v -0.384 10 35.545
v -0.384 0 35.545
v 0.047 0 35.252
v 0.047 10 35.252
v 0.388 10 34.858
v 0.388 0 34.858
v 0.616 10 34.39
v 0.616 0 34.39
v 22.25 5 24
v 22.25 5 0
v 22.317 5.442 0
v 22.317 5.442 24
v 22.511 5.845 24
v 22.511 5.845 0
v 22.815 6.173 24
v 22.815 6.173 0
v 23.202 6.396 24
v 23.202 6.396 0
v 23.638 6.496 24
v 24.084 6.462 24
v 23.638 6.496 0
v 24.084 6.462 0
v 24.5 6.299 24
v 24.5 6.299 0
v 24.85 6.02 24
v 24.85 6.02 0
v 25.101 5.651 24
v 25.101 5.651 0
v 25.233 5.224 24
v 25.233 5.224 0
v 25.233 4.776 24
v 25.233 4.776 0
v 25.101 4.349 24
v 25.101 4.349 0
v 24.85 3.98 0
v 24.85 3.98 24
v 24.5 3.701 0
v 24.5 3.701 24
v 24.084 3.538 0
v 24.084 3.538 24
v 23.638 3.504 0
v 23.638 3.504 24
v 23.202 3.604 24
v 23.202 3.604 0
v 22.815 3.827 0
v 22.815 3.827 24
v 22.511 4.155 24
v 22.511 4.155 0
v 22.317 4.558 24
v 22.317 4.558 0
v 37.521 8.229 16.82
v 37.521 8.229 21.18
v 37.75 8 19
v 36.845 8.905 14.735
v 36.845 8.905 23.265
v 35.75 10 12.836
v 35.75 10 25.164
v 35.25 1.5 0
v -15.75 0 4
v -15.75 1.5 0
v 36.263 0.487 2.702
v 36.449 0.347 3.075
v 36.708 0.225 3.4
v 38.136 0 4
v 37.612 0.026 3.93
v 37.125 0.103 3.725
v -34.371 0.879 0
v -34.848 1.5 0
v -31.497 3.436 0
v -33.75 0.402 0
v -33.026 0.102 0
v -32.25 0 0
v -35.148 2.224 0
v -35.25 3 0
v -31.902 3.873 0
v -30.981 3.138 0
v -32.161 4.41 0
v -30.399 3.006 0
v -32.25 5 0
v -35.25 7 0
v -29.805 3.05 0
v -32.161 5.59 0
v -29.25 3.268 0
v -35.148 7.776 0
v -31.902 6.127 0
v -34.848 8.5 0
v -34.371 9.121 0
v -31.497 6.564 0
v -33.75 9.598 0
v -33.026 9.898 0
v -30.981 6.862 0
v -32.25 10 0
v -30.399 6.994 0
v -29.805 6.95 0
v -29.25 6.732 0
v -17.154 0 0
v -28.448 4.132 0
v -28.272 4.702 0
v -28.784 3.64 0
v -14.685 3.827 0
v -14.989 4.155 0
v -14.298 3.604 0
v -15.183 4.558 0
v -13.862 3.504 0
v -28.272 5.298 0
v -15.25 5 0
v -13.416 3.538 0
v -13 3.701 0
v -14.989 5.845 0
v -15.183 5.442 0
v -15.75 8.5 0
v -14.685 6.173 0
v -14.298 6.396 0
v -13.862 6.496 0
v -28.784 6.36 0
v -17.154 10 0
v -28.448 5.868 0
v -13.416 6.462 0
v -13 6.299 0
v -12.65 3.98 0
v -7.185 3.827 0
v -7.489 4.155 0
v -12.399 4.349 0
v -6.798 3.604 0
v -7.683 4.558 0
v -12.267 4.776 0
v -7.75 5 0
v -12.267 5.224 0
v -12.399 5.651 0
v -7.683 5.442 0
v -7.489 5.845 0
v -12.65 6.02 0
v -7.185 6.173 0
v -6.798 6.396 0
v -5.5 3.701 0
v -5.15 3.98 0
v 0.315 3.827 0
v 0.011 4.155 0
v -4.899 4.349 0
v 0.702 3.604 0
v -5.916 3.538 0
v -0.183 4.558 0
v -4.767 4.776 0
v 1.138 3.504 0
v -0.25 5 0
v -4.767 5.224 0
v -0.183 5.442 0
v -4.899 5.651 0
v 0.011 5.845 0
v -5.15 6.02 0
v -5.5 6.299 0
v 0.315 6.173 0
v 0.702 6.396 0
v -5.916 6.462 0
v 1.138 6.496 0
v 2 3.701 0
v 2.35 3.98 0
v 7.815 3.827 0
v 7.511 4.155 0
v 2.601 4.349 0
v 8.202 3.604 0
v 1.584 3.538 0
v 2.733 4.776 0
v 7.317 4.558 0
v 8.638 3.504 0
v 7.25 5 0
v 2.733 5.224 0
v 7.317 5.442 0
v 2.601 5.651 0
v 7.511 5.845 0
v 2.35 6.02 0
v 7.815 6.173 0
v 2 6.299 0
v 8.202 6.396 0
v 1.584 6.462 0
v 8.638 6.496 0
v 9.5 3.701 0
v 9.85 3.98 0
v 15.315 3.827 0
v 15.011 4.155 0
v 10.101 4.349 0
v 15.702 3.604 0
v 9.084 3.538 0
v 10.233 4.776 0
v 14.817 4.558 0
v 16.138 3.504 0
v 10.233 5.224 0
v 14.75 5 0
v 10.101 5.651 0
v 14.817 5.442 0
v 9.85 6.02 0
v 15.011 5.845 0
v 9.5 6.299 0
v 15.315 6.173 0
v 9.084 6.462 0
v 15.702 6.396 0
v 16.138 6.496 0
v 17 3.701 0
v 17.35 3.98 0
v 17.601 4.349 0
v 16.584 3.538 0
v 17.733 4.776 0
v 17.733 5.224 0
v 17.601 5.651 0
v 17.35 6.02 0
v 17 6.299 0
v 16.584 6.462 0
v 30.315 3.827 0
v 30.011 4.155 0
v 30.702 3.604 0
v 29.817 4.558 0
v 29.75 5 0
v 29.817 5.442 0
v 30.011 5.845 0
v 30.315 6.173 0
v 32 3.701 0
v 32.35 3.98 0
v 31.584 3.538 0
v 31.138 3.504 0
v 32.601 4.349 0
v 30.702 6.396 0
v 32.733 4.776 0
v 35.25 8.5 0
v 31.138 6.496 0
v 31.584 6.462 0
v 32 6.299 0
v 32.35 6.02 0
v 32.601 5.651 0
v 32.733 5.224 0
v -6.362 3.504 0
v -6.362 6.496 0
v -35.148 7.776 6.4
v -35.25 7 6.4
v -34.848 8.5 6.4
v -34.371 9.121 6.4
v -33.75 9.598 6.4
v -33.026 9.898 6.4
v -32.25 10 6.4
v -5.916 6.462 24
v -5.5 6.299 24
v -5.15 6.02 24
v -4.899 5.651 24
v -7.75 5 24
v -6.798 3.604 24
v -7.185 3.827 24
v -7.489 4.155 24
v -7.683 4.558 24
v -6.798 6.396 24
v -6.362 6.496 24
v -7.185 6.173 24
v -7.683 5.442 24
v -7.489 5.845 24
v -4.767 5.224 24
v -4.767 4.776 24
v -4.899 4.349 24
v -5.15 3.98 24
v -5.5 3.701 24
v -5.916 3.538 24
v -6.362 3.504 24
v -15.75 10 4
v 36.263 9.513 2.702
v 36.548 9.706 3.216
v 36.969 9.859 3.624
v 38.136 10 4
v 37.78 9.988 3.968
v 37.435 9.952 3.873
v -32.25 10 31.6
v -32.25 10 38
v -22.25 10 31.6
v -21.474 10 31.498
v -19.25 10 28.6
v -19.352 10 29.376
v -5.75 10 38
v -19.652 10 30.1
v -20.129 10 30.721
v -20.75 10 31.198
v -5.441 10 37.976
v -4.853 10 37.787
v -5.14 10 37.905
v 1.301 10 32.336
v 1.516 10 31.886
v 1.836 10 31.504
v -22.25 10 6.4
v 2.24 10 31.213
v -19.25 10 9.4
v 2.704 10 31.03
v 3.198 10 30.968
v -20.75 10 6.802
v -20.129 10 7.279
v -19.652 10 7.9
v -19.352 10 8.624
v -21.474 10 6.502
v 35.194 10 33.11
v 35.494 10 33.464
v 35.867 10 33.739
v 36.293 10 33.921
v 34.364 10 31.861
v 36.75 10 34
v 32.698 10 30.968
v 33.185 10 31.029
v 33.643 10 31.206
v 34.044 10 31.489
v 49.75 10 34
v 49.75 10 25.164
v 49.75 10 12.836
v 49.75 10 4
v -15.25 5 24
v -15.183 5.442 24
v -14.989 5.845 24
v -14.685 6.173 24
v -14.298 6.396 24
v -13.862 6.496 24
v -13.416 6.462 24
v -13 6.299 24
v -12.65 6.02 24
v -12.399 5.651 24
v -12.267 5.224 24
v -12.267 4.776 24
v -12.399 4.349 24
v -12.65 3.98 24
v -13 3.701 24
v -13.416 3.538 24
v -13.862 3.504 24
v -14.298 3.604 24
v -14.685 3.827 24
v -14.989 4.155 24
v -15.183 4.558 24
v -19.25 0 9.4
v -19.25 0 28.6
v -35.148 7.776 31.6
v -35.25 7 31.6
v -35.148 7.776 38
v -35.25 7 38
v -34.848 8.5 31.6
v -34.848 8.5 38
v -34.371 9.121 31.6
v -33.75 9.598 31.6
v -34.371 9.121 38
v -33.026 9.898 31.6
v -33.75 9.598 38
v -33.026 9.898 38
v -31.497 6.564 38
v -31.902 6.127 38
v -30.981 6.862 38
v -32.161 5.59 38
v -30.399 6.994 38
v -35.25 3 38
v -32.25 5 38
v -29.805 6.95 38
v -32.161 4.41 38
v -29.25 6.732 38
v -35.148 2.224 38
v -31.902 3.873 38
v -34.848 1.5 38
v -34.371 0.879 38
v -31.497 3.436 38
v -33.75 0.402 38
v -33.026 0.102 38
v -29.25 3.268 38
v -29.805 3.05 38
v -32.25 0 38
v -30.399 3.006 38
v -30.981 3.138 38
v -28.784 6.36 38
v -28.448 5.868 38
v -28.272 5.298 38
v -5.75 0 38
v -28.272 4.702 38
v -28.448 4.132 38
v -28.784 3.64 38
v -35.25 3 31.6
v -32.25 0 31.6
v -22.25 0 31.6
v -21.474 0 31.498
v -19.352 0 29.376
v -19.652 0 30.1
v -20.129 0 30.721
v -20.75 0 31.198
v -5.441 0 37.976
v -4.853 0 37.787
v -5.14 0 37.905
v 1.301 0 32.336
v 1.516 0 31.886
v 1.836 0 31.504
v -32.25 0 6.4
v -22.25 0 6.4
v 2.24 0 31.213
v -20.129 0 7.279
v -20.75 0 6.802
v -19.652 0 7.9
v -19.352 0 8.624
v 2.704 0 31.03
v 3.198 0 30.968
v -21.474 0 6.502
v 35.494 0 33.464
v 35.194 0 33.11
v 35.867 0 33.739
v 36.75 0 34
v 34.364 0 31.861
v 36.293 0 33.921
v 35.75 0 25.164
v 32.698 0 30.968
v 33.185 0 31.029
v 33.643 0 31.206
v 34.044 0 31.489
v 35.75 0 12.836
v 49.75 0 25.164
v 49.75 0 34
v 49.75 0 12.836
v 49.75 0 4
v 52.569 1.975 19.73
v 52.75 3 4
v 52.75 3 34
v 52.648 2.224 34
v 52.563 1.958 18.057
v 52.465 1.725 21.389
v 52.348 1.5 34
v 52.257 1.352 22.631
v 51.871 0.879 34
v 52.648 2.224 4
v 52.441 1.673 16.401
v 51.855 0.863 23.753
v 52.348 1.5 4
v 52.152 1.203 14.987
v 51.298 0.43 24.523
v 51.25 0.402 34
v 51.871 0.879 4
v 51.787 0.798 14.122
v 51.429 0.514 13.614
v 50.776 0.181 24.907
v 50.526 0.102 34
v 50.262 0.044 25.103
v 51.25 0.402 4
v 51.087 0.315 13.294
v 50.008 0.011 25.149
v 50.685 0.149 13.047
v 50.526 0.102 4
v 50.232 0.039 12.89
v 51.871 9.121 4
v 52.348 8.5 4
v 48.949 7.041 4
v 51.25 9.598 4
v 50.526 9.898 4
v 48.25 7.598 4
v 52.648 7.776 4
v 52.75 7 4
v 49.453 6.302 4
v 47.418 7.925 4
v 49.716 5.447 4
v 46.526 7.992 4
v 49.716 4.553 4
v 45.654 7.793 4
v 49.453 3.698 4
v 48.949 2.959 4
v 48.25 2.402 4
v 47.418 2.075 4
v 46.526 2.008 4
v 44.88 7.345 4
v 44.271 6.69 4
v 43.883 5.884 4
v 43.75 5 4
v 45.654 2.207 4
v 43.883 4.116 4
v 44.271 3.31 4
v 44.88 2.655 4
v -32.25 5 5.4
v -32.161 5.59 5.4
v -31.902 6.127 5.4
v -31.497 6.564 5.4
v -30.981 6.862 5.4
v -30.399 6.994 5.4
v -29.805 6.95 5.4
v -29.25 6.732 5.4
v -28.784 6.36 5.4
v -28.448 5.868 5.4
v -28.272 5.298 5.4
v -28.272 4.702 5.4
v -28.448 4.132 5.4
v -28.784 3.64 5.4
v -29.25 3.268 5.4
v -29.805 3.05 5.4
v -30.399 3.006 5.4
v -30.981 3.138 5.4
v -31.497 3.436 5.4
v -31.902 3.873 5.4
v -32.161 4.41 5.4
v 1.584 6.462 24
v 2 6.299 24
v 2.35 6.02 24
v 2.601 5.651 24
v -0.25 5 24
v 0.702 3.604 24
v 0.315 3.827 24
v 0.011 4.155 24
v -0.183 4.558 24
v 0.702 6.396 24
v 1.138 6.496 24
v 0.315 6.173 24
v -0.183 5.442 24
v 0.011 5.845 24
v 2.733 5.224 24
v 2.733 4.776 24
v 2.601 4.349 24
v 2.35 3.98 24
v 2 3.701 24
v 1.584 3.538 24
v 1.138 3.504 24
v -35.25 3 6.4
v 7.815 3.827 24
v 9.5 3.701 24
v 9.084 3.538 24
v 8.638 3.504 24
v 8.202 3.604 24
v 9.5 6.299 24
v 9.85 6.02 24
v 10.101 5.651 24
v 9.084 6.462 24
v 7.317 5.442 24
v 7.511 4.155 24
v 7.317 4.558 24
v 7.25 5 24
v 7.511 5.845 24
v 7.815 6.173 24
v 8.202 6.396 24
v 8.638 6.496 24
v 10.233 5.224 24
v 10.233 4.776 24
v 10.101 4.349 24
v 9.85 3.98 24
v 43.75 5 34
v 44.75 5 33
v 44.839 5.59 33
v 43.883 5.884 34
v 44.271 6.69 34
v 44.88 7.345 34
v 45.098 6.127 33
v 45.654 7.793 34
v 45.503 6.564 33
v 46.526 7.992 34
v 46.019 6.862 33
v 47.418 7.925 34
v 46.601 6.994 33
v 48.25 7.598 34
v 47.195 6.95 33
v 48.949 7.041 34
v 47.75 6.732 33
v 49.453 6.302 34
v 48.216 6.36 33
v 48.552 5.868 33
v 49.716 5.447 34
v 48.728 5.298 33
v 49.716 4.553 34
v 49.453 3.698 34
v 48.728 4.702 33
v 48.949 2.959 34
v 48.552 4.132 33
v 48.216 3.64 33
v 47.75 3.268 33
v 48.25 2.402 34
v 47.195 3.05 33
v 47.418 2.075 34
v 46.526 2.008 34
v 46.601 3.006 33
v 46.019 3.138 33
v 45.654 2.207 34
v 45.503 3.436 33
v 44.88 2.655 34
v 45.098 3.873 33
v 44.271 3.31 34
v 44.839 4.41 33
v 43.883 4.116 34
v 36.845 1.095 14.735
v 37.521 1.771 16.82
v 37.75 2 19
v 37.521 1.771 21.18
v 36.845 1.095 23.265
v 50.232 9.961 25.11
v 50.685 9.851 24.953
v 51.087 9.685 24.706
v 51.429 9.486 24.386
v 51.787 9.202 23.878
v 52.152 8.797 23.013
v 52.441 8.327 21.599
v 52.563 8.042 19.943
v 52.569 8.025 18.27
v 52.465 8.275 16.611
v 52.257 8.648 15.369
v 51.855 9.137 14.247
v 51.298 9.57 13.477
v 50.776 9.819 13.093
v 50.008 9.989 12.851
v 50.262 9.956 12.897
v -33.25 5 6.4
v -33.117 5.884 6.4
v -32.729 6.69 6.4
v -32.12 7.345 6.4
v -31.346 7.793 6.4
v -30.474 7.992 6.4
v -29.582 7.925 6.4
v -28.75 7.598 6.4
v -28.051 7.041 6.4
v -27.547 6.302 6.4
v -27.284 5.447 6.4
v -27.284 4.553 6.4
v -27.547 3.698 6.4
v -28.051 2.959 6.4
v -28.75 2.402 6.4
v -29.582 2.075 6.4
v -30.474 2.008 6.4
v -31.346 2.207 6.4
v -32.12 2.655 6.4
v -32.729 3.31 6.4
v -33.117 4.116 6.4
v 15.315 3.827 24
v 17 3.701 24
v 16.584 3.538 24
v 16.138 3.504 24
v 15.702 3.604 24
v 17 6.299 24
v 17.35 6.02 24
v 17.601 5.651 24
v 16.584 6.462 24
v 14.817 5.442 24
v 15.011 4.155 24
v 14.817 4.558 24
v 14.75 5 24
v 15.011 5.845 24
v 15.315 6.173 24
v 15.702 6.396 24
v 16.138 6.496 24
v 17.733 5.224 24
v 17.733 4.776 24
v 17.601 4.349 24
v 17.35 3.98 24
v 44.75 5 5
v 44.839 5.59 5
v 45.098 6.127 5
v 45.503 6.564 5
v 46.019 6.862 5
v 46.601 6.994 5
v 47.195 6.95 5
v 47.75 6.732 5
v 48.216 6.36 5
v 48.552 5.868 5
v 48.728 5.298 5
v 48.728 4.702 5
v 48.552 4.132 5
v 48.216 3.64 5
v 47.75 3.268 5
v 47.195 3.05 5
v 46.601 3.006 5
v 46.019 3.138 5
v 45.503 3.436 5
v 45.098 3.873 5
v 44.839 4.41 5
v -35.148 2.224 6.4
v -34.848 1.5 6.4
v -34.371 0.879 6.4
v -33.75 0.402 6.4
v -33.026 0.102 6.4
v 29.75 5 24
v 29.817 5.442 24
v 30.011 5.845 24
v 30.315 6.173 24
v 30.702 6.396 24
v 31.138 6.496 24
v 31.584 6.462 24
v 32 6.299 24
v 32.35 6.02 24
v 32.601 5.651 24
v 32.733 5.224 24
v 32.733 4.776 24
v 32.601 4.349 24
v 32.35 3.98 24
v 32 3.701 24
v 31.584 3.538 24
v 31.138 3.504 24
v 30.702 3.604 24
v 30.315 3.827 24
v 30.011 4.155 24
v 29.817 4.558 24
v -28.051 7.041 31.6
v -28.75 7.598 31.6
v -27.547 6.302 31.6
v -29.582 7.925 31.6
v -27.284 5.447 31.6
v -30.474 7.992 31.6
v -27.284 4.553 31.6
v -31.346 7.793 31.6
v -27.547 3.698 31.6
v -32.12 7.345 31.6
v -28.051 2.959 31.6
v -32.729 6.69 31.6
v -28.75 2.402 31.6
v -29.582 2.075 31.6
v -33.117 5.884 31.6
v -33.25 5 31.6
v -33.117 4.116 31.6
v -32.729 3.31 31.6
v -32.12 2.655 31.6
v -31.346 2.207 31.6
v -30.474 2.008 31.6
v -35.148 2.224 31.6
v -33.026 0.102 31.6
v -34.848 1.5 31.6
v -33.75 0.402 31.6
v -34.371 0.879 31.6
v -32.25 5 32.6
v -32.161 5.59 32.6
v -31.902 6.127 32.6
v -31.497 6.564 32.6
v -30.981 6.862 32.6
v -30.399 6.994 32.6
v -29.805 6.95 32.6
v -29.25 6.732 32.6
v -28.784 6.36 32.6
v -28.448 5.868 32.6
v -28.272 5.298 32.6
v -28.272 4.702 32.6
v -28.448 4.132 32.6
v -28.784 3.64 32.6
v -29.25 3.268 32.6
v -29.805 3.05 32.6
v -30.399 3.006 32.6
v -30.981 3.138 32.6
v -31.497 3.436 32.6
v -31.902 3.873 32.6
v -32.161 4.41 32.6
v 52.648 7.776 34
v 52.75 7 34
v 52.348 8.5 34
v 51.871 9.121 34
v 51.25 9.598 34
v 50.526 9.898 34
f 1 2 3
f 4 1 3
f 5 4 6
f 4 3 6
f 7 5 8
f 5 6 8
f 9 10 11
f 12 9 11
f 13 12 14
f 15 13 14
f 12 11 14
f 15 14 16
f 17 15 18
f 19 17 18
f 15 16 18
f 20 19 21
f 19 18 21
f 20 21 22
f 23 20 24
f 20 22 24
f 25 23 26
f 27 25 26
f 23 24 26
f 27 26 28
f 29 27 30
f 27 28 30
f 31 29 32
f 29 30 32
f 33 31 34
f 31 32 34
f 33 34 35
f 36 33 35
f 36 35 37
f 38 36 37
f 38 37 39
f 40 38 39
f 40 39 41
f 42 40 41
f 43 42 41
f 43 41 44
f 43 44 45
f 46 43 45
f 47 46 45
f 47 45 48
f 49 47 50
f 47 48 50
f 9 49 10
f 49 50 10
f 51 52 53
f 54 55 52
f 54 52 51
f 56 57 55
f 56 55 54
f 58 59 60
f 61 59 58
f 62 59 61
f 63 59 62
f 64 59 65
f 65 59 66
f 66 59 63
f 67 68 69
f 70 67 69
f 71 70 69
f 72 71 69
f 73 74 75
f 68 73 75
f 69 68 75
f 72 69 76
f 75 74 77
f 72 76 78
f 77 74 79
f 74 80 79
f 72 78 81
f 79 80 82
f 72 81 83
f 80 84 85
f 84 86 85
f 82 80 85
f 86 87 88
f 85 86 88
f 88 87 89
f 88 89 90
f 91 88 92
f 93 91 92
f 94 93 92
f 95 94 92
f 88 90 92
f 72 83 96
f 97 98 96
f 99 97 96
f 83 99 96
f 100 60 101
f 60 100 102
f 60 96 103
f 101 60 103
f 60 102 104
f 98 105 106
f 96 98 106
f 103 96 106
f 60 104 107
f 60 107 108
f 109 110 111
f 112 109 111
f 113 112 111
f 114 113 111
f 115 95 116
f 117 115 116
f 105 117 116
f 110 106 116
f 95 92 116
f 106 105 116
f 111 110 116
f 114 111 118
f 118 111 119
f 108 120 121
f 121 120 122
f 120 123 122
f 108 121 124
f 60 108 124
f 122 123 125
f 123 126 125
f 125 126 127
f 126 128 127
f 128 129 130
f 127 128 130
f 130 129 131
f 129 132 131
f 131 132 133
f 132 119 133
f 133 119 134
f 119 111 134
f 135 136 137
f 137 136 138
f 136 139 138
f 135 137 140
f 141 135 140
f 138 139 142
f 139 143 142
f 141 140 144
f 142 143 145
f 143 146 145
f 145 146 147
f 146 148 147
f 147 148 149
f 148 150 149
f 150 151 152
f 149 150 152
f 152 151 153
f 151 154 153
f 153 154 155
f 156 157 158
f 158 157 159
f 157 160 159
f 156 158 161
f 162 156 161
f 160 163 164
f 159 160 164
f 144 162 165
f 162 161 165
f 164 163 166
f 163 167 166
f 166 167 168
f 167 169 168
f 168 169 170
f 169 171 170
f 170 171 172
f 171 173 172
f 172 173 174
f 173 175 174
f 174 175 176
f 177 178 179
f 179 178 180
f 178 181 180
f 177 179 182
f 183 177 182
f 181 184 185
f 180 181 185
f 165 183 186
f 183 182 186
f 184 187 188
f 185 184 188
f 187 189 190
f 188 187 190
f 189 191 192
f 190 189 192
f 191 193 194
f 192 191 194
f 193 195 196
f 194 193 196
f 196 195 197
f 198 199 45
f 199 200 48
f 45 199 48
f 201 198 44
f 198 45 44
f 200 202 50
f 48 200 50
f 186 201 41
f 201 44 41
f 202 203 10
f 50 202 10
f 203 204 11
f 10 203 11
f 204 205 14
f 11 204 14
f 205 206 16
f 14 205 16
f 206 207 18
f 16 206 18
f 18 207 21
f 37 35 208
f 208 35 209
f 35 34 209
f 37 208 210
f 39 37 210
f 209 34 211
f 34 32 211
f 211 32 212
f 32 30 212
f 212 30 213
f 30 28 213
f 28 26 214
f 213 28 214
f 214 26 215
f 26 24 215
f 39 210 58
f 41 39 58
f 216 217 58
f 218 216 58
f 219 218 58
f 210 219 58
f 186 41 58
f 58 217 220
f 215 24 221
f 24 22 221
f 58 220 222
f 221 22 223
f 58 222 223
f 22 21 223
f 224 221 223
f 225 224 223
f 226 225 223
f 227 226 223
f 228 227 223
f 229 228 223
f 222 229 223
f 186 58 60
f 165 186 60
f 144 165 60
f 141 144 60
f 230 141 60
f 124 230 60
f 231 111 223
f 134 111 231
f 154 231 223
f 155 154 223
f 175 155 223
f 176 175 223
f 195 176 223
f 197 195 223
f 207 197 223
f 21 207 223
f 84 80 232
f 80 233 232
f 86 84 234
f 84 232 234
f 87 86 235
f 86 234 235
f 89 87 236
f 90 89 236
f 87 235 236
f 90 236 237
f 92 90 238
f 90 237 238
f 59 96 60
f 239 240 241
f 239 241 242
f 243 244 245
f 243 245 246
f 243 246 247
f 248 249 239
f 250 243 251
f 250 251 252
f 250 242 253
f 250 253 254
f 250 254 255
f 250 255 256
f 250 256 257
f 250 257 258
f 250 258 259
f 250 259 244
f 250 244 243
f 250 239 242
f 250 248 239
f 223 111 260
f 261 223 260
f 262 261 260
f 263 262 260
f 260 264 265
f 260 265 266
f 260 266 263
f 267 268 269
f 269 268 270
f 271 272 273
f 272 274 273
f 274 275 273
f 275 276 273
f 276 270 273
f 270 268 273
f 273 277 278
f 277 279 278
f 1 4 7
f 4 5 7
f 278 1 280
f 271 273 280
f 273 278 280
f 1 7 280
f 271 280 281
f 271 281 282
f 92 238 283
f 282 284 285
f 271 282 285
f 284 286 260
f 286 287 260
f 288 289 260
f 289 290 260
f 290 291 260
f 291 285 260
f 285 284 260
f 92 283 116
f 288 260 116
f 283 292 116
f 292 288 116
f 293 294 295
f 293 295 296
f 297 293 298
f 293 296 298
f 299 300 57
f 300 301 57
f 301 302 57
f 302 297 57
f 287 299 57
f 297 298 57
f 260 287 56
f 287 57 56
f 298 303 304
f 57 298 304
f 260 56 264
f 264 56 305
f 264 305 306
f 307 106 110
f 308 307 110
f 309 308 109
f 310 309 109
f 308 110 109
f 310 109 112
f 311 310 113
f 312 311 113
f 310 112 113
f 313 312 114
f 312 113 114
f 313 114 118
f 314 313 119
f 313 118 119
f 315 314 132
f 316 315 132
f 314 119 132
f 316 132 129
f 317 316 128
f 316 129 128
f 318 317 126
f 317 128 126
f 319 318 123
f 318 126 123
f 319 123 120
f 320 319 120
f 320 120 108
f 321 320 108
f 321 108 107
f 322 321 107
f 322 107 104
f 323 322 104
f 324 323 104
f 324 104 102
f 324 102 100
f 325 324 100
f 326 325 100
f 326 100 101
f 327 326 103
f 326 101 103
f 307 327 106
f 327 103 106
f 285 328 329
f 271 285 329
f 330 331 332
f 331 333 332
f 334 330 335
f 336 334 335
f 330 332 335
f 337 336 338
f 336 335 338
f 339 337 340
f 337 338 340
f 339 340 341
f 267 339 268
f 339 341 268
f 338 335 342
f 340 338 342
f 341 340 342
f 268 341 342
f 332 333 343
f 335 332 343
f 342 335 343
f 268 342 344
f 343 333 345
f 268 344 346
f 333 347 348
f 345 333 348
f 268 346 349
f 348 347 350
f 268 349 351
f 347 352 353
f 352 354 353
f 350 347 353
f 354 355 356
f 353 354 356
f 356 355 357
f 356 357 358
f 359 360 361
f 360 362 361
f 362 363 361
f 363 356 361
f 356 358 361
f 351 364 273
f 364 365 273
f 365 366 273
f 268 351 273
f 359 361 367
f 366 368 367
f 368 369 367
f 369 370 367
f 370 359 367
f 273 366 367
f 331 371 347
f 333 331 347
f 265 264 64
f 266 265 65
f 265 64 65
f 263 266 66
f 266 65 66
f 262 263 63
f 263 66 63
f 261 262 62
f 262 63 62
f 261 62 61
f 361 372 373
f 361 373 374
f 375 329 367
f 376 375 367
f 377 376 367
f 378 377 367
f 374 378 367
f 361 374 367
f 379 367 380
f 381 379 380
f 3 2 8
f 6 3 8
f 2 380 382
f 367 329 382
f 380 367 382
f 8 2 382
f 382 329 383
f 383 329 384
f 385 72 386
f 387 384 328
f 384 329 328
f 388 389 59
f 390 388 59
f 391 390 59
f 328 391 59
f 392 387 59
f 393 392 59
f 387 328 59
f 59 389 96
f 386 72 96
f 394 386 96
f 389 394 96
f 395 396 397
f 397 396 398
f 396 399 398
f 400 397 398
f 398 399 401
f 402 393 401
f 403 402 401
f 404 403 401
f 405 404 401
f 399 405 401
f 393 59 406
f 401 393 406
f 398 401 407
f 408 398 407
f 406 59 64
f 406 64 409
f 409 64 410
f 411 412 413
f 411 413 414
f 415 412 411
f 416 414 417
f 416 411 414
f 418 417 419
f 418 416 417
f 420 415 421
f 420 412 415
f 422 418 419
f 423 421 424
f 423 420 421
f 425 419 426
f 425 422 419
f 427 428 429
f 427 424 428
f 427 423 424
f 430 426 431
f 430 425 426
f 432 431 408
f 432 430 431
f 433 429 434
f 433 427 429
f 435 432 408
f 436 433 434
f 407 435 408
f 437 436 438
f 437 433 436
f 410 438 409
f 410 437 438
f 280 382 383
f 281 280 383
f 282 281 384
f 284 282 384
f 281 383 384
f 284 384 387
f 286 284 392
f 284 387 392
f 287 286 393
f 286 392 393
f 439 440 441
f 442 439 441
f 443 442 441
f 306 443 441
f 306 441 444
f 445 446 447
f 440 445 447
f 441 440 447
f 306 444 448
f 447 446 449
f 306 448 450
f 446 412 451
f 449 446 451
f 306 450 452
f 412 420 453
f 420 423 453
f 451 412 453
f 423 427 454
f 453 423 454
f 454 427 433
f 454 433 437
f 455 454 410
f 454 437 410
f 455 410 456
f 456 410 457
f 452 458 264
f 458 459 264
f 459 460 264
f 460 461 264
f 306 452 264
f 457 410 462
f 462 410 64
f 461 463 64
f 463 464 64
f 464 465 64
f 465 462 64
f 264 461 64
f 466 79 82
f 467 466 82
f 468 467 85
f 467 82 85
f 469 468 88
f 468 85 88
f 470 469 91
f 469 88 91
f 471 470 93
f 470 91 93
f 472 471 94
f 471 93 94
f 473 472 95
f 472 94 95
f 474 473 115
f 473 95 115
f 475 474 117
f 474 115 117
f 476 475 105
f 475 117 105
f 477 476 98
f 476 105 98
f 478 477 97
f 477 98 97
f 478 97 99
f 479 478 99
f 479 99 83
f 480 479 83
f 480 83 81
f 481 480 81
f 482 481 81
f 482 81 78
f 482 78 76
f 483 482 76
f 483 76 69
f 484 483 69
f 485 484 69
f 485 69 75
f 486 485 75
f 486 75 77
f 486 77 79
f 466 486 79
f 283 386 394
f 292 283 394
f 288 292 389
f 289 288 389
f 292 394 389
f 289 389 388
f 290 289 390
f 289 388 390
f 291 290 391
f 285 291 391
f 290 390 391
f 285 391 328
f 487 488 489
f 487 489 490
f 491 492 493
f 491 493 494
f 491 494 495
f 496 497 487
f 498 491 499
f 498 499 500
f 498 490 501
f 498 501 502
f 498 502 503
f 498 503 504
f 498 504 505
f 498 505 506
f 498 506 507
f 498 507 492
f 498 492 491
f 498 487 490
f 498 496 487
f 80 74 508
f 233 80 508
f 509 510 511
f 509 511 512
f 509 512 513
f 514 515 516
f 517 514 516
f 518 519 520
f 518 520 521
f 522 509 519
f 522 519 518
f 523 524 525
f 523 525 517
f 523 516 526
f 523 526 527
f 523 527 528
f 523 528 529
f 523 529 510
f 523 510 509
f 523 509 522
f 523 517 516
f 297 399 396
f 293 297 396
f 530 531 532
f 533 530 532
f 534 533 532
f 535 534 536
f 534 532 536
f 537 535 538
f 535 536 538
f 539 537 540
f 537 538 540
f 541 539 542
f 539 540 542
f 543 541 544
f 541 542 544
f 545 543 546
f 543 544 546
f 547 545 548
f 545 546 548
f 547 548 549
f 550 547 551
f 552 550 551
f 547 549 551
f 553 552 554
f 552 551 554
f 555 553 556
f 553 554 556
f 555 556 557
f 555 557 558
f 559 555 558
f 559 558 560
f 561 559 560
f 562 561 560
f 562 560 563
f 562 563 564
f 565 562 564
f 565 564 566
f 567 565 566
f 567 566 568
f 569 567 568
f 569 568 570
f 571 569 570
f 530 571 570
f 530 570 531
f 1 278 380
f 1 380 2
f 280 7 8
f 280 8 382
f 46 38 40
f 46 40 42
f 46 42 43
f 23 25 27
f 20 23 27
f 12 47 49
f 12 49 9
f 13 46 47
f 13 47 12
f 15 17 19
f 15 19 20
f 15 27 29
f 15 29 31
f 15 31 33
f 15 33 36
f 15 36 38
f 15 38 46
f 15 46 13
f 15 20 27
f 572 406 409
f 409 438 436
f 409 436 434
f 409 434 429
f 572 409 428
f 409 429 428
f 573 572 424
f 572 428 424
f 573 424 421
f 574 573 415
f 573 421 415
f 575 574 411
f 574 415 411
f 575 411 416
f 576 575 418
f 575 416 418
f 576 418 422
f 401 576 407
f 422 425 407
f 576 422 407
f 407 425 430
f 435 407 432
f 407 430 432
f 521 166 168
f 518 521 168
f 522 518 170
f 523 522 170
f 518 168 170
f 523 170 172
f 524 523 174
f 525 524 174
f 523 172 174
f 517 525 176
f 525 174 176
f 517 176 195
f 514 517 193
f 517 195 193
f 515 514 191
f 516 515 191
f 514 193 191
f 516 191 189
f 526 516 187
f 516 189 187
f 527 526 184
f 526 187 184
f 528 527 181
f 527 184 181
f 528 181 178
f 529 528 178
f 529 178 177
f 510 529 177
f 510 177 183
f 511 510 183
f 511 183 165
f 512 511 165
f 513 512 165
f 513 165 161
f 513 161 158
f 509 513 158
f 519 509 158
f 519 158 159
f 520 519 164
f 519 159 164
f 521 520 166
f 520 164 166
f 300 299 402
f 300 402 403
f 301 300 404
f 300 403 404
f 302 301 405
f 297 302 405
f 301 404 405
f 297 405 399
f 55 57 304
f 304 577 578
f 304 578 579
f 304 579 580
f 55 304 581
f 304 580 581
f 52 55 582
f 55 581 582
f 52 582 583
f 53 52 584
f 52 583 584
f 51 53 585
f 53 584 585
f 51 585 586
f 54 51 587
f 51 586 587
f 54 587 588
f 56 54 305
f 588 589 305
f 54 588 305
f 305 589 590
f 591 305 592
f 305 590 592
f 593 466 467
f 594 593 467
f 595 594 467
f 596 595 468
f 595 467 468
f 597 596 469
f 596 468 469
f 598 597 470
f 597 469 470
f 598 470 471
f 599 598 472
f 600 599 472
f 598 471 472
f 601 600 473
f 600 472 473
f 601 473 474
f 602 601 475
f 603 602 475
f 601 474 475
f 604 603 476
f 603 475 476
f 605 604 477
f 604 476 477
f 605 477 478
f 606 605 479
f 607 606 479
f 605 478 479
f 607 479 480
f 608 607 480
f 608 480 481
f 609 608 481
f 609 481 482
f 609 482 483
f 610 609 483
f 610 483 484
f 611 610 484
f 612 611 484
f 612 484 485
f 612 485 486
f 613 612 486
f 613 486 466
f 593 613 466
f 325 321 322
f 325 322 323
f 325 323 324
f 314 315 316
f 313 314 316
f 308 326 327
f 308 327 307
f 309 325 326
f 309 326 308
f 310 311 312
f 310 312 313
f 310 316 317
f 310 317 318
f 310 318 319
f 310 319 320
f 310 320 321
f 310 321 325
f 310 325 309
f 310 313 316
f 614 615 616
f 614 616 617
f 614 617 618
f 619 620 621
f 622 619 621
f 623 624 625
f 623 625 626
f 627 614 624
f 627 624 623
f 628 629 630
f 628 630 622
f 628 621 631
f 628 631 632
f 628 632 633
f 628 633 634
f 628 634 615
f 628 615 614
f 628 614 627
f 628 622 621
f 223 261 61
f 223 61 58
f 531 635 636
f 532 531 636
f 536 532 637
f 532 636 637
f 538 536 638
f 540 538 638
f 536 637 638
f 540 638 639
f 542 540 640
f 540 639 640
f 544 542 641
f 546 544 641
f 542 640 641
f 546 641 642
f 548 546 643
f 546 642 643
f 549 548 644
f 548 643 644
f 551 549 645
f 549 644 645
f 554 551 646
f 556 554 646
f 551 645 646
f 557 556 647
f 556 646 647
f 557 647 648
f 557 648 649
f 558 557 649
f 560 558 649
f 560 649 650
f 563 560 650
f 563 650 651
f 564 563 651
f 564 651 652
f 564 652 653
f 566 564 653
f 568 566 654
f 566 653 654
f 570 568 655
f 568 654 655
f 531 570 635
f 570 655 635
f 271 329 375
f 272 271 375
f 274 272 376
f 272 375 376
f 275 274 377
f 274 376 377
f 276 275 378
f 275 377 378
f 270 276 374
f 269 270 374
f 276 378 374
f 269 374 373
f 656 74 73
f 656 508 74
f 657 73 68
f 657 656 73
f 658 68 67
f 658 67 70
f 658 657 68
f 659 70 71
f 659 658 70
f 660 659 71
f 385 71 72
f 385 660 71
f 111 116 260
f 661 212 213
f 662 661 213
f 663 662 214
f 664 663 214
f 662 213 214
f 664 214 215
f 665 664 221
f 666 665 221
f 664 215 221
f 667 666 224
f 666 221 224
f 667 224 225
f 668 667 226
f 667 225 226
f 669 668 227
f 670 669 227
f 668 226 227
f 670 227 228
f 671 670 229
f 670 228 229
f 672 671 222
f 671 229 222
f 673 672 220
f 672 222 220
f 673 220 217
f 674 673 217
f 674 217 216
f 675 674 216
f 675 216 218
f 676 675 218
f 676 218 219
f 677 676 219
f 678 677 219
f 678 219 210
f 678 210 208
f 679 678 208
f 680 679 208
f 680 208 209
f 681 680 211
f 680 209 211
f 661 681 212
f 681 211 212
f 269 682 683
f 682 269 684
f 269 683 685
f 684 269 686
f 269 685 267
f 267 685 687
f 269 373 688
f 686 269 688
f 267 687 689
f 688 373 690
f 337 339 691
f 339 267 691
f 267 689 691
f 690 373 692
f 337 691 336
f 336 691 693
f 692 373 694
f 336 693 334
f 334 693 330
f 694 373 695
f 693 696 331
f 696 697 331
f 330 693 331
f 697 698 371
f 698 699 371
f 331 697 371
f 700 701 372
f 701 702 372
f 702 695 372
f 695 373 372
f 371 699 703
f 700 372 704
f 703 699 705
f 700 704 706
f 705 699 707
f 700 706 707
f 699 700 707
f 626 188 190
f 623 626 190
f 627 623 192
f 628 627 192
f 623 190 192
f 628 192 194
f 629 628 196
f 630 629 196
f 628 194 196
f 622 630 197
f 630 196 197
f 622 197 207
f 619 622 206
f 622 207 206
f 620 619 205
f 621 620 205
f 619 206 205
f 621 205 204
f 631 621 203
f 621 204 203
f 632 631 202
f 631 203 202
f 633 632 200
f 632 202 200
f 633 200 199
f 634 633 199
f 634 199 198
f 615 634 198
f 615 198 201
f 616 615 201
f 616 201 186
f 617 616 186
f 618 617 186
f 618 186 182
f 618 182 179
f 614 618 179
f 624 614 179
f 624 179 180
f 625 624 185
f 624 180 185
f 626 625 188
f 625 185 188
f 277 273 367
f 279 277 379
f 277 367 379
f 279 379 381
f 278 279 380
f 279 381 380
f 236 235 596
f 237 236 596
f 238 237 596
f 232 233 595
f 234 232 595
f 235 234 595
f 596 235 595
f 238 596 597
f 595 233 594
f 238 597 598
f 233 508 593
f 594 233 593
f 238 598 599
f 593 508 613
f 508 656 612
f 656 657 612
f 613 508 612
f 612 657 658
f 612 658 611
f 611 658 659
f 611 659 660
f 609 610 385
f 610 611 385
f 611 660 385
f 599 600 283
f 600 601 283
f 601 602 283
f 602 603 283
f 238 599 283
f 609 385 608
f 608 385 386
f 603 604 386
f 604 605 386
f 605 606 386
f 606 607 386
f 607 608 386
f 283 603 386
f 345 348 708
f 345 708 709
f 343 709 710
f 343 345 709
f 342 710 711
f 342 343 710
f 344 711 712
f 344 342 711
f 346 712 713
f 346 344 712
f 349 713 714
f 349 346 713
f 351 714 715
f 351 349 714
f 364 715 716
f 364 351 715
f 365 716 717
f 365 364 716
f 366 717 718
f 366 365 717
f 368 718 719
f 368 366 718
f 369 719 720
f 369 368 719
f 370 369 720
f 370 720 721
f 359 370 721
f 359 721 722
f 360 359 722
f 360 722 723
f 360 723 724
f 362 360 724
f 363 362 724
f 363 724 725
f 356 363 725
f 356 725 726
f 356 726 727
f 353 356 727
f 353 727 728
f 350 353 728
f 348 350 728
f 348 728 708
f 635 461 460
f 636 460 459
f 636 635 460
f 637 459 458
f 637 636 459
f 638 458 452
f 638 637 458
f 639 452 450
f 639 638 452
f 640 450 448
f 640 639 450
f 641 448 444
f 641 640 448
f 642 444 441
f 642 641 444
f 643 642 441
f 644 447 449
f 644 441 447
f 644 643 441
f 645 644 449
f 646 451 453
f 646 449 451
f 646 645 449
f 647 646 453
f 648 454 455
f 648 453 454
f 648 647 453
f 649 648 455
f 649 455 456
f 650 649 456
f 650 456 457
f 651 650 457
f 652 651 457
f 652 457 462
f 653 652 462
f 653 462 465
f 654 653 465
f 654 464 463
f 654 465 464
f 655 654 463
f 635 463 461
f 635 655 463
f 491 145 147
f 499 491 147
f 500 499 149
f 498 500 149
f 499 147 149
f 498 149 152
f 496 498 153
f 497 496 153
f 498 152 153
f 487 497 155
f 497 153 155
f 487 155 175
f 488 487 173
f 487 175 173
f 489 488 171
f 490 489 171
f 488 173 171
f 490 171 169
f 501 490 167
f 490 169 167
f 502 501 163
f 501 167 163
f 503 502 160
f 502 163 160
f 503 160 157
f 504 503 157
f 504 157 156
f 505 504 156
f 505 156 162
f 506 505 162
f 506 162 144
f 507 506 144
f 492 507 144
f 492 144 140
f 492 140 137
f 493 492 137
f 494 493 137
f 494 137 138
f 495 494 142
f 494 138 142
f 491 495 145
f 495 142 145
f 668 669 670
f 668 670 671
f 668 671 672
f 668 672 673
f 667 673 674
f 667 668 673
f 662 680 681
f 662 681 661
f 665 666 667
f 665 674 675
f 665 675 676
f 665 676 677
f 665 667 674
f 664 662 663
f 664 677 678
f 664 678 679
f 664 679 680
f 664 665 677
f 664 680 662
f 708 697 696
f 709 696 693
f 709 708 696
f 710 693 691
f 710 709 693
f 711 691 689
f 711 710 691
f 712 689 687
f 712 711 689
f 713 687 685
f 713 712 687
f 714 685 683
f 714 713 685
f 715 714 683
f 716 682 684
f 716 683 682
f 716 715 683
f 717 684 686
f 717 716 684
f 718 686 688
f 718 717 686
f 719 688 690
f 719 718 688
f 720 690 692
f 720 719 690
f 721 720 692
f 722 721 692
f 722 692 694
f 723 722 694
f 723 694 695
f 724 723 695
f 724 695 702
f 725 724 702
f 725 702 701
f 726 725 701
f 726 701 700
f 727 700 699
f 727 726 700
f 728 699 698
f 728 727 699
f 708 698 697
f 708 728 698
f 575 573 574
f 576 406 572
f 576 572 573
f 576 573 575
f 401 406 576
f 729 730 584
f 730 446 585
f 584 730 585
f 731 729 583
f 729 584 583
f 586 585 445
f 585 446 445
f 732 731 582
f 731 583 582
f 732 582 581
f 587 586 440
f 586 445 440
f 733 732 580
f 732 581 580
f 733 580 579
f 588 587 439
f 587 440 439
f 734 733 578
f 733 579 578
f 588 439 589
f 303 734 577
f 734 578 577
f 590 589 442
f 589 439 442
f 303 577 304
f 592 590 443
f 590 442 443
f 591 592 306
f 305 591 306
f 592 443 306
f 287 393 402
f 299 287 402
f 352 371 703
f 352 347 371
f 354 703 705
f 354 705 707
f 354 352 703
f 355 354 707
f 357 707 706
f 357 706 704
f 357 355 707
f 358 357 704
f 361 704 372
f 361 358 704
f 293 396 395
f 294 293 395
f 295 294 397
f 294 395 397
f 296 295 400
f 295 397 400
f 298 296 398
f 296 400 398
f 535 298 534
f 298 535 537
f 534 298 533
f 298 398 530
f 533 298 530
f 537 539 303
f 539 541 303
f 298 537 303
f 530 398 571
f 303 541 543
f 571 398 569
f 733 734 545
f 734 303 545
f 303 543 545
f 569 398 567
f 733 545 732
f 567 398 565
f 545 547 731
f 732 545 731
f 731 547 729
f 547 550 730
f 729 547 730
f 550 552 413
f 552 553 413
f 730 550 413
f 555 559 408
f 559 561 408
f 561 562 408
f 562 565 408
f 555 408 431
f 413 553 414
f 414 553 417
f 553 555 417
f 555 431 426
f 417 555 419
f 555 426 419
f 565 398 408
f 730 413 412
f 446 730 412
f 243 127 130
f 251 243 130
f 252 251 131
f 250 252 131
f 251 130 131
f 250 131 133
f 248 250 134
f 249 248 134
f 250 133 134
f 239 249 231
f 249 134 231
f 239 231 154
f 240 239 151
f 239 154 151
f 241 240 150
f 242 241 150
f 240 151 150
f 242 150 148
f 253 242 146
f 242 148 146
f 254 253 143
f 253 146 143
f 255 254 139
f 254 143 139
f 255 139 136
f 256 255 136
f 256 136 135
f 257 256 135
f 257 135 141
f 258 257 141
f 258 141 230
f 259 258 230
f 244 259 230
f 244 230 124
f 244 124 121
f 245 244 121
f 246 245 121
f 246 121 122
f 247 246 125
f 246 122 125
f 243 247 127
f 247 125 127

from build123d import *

# Parameters (mm, degrees)
BOSS_EXTRUDE1_DEPTH           = 10
FILLET1_R                     = 3
CUT_EXTRUDE1_DEPTH            = 55.386
CHAMFER1_SIZE                 = 1.5
MIRROR3_START                 = -3.745316975
MIRROR3_DEPTH                 = 4.272002108
CSK_FOR_M4_SFHCS1_D           = 4
CSK_FOR_M4_SFHCS1_DEPTH       = 6.4
CSK_FOR_M4_SFHCS1_CSINK_D     = 6
CSK_FOR_M4_SFHCS1_CSINK_ANGLE = 90
CSK_FOR_M4_SFHCS2_D           = 4
CSK_FOR_M4_SFHCS2_CSINK_D     = 6
CSK_FOR_M4_SFHCS2_CSINK_ANGLE = 90
SKETCH7_R                     = 1.5
CUT_EXTRUDE2_DEPTH            = 24
SKETCH8_R                     = 10.5
CUT_EXTRUDE3_DEPTH            = 15
CHAMFER2_SIZE                 = 2


# Read off the part's stored shape, not the designer's step: Mirror3
with BuildPart() as part:
    # Sketch1 → Boss-Extrude1 (new body)
    with BuildSketch(Plane(origin=(0, 0, 0), x_dir=(1, 0, 0), z_dir=(0, 1, 0))):
        with BuildLine():
            Line((-35.25, 0), (-35.25, -6.4))
            Line((-35.25, -6.4), (-22.25, -6.4))
            ThreePointArc((-22.25, -6.4), (-20.128679656, -7.278679656), (-19.25, -9.4))
            Line((-19.25, -9.4), (-19.25, -28.6))
            ThreePointArc((-19.25, -28.6), (-20.128679656, -30.721320344), (-22.25, -31.6))
            Line((-22.25, -31.6), (-35.25, -31.6))
            Line((-35.25, -31.6), (-35.25, -38))
            Line((-35.25, -38), (-5.75, -38))
            ThreePointArc((-5.75, -38), (-5.289009014, -37.946146786), (-4.852843875, -37.787487311))
            Line((-4.852843875, -37.787487311), (-0.384125597, -35.544596998))
            ThreePointArc((-0.384125597, -35.544596998), (0.230625744, -35.066359782), (0.616084961, -34.389564956))
            Line((0.616084961, -34.389564956), (1.30066574, -32.33582167))
            ThreePointArc((1.30066574, -32.33582167), (2.028611742, -31.34579265), (3.198032424, -30.968276939))
            Line((3.198032424, -30.968276939), (32.698032424, -30.968276939))
            ThreePointArc((32.698032424, -30.968276939), (33.642903174, -31.205546312), (34.363585035, -31.861057674))
            Line((34.363585035, -31.861057674), (35.193999483, -33.110222133))
            ThreePointArc((35.193999483, -33.110222133), (35.866740637, -33.73918414), (36.750000973, -34.000000252))
            Line((36.750000973, -34.000000252), (52.750000973, -34.000000252))
            Line((52.750000973, -34.000000252), (52.750000973, -4.000000252))
            Line((52.750000973, -4.000000252), (38.13600074, -4.000000252))
            ThreePointArc((38.13600074, -4.000000252), (36.996810987, -3.643851433), (36.263342318, -2.702246958))
            Line((36.263342318, -2.702246958), (35.25, 0))
            Line((35.25, 0), (-35.25, 0))
        make_face()
    extrude(amount=BOSS_EXTRUDE1_DEPTH)

    # Fillet1
    fillet1_edges = [part.edges().sort_by_distance(p)[0] for p in [
        (52.750000973, 0, 19.000000252),
        (-35.25, 0, 34.8),
        (-35.25, 0, 3.2),
        (-35.25, 10, 34.8),
        (52.750000973, 10, 19.000000252),
        (-35.25, 10, 3.2),
    ]]
    fillet(fillet1_edges, radius=FILLET1_R)

    # Sketch2 → Cut-Extrude1 (cut)
    with BuildSketch(Plane(origin=(38.13600074, 0, 0), x_dir=(0, 0, -1), z_dir=(1, 0, 0))):
        Polygon((-4.000000252, 10), (0, 10), (0, 8.5), align=None)
    extrude(amount=-CUT_EXTRUDE1_DEPTH, mode=Mode.SUBTRACT)

    # Chamfer1
    # the kernel refuses this chamfer: 1.5 mm, written as the material it adds along each edge
    with BuildSketch(Plane(origin=(-17.24999926, 7.145532803, -3.611912754), x_dir=(-0.027495876610586757, 0.9359751746095561, -0.35099066837171944), z_dir=(0, 0.3511234221997007, 0.9363291848398034))) as chamfer1_piece_1_section:
        Polygon((CHAMFER1_SIZE * 0.999621916911, -CHAMFER1_SIZE * 0.0274958766106), (-CHAMFER1_SIZE * 0.0274958766106, -CHAMFER1_SIZE * 0.999621916911), (0, 0), align=None)
    chamfer1_piece_1 = extrude(amount=11.987051072, mode=Mode.PRIVATE)
    chamfer1_piece_1 = split(chamfer1_piece_1, bisect_by=Plane(origin=(-16.68097762, 9.443284972, 0), z_dir=(0, 0, 1)), keep=Keep.TOP, mode=Mode.PRIVATE)
    chamfer1_piece_1 = split(chamfer1_piece_1, bisect_by=Plane(origin=(-16.68097762, 10, 1.484573502), z_dir=(0, -1, 0)), keep=Keep.TOP, mode=Mode.PRIVATE)
    add(chamfer1_piece_1)

    # Mirror3 outline → Mirror3 (cut)
    with BuildSketch(Plane(origin=(0, 0, 0), x_dir=(1, 0, 0), z_dir=(0, 0.3511234221997011, -0.9363291848398033)).offset(MIRROR3_START)):
        Polygon((-15.74999926, -1.404493777), (40, -1.404493777), (40, 2), (-19, 2), (-19, 1.845506963), align=None)
    extrude(amount=MIRROR3_DEPTH, mode=Mode.SUBTRACT)

    # CSK for M4 SFHCS1
    with Locations(Plane.XY.offset(6.4)):
        with Locations((-30.25, 5)):
            csk_for_m4_sfhcs1 = CounterSinkHole(CSK_FOR_M4_SFHCS1_D / 2, CSK_FOR_M4_SFHCS1_CSINK_D / 2, depth=CSK_FOR_M4_SFHCS1_DEPTH, counter_sink_angle=CSK_FOR_M4_SFHCS1_CSINK_ANGLE)

    # Mirror1: CSK for M4 SFHCS1 across plane
    add(csk_for_m4_sfhcs1.mirror(Plane.XY.offset(19)), mode=Mode.SUBTRACT)

    # CSK for M4 SFHCS2 (through all)
    with Locations(Plane.XY.offset(34.000000252)):
        with Locations((46.750000973, 5)):
            csk_for_m4_sfhcs2 = CounterSinkHole(CSK_FOR_M4_SFHCS2_D / 2, CSK_FOR_M4_SFHCS2_CSINK_D / 2, counter_sink_angle=CSK_FOR_M4_SFHCS2_CSINK_ANGLE)

    # Mirror2: CSK for M4 SFHCS2 across plane
    add(csk_for_m4_sfhcs2.mirror(Plane.XY.offset(19)), mode=Mode.SUBTRACT)

    # Sketch7 → Cut-Extrude2 (cut)
    with BuildSketch(Plane(origin=(0, 0, 0), x_dir=(-1, 0, 0), z_dir=(0, 0, -1))):
        with Locations((-31.25, 5)):
            Circle(SKETCH7_R)
        with Locations((-23.75, 5)):
            Circle(SKETCH7_R)
        with Locations((-16.25, 5)):
            Circle(SKETCH7_R)
        with Locations((-8.75, 5)):
            Circle(SKETCH7_R)
        with Locations((-1.25, 5)):
            Circle(SKETCH7_R)
        with Locations((6.25, 5)):
            Circle(SKETCH7_R)
        with Locations((13.75, 5)):
            Circle(SKETCH7_R)
    extrude(amount=-CUT_EXTRUDE2_DEPTH, mode=Mode.SUBTRACT)

    # Sketch8 → Cut-Extrude3 (cut)
    with BuildSketch(Plane(origin=(52.750000973, 0, 0), x_dir=(0, 0, -1), z_dir=(1, 0, 0))):
        with Locations((-19.000000252, 18.5)):
            Circle(SKETCH8_R)
        with Locations((-19.000000252, -8.5)):
            Circle(SKETCH8_R)
    extrude(amount=-CUT_EXTRUDE3_DEPTH, mode=Mode.SUBTRACT)

    # Chamfer2
    # the kernel refuses this chamfer: 2 mm, written as the material it adds along each edge
    # the kernel refuses this chamfer: 2 mm, written as the material it takes off along each edge
    with BuildSketch(Plane(origin=(37.750000973, 10, 7.692220273), x_dir=(-0.9996219169112968, 0.02749587661058651, 0), z_dir=(0, 0, 1))) as chamfer2_2_piece_1_section:
        Polygon((CHAMFER2_SIZE * 0.999621916911, CHAMFER2_SIZE * 0.0274958766106), (-CHAMFER2_SIZE * 0.0274958766106, CHAMFER2_SIZE * 0.999621916911), (0, 0), align=None)
    chamfer2_2_piece_1 = extrude(amount=22.615559958, mode=Mode.PRIVATE)
    chamfer2_2_piece_1 = chamfer2_2_piece_1 & Plane(origin=(37.038023767, 18.5, 19.000000252), x_dir=(0, 0, -1), z_dir=(1, 0, 0)) * Cylinder(10.5, 54, mode=Mode.PRIVATE)
    add(chamfer2_2_piece_1, mode=Mode.SUBTRACT)
    with BuildSketch(Plane(origin=(37.750000973, 0, 30.307780231), x_dir=(-0.9996219169112968, -0.02749587661058639, 0), z_dir=(0, 0, -1))) as chamfer2_2_piece_2_section:
        Polygon((CHAMFER2_SIZE * 0.999621916911, CHAMFER2_SIZE * 0.0274958766106), (-CHAMFER2_SIZE * 0.0274958766106, CHAMFER2_SIZE * 0.999621916911), (0, 0), align=None)
    chamfer2_2_piece_2 = extrude(amount=22.615559958, mode=Mode.PRIVATE)
    chamfer2_2_piece_2 = chamfer2_2_piece_2 & Plane(origin=(37.038023767, -8.5, 19.000000252), x_dir=(0, 0, -1), z_dir=(1, 0, 0)) * Cylinder(10.5, 54, mode=Mode.PRIVATE)
    add(chamfer2_2_piece_2, mode=Mode.SUBTRACT)


solid = part.part
